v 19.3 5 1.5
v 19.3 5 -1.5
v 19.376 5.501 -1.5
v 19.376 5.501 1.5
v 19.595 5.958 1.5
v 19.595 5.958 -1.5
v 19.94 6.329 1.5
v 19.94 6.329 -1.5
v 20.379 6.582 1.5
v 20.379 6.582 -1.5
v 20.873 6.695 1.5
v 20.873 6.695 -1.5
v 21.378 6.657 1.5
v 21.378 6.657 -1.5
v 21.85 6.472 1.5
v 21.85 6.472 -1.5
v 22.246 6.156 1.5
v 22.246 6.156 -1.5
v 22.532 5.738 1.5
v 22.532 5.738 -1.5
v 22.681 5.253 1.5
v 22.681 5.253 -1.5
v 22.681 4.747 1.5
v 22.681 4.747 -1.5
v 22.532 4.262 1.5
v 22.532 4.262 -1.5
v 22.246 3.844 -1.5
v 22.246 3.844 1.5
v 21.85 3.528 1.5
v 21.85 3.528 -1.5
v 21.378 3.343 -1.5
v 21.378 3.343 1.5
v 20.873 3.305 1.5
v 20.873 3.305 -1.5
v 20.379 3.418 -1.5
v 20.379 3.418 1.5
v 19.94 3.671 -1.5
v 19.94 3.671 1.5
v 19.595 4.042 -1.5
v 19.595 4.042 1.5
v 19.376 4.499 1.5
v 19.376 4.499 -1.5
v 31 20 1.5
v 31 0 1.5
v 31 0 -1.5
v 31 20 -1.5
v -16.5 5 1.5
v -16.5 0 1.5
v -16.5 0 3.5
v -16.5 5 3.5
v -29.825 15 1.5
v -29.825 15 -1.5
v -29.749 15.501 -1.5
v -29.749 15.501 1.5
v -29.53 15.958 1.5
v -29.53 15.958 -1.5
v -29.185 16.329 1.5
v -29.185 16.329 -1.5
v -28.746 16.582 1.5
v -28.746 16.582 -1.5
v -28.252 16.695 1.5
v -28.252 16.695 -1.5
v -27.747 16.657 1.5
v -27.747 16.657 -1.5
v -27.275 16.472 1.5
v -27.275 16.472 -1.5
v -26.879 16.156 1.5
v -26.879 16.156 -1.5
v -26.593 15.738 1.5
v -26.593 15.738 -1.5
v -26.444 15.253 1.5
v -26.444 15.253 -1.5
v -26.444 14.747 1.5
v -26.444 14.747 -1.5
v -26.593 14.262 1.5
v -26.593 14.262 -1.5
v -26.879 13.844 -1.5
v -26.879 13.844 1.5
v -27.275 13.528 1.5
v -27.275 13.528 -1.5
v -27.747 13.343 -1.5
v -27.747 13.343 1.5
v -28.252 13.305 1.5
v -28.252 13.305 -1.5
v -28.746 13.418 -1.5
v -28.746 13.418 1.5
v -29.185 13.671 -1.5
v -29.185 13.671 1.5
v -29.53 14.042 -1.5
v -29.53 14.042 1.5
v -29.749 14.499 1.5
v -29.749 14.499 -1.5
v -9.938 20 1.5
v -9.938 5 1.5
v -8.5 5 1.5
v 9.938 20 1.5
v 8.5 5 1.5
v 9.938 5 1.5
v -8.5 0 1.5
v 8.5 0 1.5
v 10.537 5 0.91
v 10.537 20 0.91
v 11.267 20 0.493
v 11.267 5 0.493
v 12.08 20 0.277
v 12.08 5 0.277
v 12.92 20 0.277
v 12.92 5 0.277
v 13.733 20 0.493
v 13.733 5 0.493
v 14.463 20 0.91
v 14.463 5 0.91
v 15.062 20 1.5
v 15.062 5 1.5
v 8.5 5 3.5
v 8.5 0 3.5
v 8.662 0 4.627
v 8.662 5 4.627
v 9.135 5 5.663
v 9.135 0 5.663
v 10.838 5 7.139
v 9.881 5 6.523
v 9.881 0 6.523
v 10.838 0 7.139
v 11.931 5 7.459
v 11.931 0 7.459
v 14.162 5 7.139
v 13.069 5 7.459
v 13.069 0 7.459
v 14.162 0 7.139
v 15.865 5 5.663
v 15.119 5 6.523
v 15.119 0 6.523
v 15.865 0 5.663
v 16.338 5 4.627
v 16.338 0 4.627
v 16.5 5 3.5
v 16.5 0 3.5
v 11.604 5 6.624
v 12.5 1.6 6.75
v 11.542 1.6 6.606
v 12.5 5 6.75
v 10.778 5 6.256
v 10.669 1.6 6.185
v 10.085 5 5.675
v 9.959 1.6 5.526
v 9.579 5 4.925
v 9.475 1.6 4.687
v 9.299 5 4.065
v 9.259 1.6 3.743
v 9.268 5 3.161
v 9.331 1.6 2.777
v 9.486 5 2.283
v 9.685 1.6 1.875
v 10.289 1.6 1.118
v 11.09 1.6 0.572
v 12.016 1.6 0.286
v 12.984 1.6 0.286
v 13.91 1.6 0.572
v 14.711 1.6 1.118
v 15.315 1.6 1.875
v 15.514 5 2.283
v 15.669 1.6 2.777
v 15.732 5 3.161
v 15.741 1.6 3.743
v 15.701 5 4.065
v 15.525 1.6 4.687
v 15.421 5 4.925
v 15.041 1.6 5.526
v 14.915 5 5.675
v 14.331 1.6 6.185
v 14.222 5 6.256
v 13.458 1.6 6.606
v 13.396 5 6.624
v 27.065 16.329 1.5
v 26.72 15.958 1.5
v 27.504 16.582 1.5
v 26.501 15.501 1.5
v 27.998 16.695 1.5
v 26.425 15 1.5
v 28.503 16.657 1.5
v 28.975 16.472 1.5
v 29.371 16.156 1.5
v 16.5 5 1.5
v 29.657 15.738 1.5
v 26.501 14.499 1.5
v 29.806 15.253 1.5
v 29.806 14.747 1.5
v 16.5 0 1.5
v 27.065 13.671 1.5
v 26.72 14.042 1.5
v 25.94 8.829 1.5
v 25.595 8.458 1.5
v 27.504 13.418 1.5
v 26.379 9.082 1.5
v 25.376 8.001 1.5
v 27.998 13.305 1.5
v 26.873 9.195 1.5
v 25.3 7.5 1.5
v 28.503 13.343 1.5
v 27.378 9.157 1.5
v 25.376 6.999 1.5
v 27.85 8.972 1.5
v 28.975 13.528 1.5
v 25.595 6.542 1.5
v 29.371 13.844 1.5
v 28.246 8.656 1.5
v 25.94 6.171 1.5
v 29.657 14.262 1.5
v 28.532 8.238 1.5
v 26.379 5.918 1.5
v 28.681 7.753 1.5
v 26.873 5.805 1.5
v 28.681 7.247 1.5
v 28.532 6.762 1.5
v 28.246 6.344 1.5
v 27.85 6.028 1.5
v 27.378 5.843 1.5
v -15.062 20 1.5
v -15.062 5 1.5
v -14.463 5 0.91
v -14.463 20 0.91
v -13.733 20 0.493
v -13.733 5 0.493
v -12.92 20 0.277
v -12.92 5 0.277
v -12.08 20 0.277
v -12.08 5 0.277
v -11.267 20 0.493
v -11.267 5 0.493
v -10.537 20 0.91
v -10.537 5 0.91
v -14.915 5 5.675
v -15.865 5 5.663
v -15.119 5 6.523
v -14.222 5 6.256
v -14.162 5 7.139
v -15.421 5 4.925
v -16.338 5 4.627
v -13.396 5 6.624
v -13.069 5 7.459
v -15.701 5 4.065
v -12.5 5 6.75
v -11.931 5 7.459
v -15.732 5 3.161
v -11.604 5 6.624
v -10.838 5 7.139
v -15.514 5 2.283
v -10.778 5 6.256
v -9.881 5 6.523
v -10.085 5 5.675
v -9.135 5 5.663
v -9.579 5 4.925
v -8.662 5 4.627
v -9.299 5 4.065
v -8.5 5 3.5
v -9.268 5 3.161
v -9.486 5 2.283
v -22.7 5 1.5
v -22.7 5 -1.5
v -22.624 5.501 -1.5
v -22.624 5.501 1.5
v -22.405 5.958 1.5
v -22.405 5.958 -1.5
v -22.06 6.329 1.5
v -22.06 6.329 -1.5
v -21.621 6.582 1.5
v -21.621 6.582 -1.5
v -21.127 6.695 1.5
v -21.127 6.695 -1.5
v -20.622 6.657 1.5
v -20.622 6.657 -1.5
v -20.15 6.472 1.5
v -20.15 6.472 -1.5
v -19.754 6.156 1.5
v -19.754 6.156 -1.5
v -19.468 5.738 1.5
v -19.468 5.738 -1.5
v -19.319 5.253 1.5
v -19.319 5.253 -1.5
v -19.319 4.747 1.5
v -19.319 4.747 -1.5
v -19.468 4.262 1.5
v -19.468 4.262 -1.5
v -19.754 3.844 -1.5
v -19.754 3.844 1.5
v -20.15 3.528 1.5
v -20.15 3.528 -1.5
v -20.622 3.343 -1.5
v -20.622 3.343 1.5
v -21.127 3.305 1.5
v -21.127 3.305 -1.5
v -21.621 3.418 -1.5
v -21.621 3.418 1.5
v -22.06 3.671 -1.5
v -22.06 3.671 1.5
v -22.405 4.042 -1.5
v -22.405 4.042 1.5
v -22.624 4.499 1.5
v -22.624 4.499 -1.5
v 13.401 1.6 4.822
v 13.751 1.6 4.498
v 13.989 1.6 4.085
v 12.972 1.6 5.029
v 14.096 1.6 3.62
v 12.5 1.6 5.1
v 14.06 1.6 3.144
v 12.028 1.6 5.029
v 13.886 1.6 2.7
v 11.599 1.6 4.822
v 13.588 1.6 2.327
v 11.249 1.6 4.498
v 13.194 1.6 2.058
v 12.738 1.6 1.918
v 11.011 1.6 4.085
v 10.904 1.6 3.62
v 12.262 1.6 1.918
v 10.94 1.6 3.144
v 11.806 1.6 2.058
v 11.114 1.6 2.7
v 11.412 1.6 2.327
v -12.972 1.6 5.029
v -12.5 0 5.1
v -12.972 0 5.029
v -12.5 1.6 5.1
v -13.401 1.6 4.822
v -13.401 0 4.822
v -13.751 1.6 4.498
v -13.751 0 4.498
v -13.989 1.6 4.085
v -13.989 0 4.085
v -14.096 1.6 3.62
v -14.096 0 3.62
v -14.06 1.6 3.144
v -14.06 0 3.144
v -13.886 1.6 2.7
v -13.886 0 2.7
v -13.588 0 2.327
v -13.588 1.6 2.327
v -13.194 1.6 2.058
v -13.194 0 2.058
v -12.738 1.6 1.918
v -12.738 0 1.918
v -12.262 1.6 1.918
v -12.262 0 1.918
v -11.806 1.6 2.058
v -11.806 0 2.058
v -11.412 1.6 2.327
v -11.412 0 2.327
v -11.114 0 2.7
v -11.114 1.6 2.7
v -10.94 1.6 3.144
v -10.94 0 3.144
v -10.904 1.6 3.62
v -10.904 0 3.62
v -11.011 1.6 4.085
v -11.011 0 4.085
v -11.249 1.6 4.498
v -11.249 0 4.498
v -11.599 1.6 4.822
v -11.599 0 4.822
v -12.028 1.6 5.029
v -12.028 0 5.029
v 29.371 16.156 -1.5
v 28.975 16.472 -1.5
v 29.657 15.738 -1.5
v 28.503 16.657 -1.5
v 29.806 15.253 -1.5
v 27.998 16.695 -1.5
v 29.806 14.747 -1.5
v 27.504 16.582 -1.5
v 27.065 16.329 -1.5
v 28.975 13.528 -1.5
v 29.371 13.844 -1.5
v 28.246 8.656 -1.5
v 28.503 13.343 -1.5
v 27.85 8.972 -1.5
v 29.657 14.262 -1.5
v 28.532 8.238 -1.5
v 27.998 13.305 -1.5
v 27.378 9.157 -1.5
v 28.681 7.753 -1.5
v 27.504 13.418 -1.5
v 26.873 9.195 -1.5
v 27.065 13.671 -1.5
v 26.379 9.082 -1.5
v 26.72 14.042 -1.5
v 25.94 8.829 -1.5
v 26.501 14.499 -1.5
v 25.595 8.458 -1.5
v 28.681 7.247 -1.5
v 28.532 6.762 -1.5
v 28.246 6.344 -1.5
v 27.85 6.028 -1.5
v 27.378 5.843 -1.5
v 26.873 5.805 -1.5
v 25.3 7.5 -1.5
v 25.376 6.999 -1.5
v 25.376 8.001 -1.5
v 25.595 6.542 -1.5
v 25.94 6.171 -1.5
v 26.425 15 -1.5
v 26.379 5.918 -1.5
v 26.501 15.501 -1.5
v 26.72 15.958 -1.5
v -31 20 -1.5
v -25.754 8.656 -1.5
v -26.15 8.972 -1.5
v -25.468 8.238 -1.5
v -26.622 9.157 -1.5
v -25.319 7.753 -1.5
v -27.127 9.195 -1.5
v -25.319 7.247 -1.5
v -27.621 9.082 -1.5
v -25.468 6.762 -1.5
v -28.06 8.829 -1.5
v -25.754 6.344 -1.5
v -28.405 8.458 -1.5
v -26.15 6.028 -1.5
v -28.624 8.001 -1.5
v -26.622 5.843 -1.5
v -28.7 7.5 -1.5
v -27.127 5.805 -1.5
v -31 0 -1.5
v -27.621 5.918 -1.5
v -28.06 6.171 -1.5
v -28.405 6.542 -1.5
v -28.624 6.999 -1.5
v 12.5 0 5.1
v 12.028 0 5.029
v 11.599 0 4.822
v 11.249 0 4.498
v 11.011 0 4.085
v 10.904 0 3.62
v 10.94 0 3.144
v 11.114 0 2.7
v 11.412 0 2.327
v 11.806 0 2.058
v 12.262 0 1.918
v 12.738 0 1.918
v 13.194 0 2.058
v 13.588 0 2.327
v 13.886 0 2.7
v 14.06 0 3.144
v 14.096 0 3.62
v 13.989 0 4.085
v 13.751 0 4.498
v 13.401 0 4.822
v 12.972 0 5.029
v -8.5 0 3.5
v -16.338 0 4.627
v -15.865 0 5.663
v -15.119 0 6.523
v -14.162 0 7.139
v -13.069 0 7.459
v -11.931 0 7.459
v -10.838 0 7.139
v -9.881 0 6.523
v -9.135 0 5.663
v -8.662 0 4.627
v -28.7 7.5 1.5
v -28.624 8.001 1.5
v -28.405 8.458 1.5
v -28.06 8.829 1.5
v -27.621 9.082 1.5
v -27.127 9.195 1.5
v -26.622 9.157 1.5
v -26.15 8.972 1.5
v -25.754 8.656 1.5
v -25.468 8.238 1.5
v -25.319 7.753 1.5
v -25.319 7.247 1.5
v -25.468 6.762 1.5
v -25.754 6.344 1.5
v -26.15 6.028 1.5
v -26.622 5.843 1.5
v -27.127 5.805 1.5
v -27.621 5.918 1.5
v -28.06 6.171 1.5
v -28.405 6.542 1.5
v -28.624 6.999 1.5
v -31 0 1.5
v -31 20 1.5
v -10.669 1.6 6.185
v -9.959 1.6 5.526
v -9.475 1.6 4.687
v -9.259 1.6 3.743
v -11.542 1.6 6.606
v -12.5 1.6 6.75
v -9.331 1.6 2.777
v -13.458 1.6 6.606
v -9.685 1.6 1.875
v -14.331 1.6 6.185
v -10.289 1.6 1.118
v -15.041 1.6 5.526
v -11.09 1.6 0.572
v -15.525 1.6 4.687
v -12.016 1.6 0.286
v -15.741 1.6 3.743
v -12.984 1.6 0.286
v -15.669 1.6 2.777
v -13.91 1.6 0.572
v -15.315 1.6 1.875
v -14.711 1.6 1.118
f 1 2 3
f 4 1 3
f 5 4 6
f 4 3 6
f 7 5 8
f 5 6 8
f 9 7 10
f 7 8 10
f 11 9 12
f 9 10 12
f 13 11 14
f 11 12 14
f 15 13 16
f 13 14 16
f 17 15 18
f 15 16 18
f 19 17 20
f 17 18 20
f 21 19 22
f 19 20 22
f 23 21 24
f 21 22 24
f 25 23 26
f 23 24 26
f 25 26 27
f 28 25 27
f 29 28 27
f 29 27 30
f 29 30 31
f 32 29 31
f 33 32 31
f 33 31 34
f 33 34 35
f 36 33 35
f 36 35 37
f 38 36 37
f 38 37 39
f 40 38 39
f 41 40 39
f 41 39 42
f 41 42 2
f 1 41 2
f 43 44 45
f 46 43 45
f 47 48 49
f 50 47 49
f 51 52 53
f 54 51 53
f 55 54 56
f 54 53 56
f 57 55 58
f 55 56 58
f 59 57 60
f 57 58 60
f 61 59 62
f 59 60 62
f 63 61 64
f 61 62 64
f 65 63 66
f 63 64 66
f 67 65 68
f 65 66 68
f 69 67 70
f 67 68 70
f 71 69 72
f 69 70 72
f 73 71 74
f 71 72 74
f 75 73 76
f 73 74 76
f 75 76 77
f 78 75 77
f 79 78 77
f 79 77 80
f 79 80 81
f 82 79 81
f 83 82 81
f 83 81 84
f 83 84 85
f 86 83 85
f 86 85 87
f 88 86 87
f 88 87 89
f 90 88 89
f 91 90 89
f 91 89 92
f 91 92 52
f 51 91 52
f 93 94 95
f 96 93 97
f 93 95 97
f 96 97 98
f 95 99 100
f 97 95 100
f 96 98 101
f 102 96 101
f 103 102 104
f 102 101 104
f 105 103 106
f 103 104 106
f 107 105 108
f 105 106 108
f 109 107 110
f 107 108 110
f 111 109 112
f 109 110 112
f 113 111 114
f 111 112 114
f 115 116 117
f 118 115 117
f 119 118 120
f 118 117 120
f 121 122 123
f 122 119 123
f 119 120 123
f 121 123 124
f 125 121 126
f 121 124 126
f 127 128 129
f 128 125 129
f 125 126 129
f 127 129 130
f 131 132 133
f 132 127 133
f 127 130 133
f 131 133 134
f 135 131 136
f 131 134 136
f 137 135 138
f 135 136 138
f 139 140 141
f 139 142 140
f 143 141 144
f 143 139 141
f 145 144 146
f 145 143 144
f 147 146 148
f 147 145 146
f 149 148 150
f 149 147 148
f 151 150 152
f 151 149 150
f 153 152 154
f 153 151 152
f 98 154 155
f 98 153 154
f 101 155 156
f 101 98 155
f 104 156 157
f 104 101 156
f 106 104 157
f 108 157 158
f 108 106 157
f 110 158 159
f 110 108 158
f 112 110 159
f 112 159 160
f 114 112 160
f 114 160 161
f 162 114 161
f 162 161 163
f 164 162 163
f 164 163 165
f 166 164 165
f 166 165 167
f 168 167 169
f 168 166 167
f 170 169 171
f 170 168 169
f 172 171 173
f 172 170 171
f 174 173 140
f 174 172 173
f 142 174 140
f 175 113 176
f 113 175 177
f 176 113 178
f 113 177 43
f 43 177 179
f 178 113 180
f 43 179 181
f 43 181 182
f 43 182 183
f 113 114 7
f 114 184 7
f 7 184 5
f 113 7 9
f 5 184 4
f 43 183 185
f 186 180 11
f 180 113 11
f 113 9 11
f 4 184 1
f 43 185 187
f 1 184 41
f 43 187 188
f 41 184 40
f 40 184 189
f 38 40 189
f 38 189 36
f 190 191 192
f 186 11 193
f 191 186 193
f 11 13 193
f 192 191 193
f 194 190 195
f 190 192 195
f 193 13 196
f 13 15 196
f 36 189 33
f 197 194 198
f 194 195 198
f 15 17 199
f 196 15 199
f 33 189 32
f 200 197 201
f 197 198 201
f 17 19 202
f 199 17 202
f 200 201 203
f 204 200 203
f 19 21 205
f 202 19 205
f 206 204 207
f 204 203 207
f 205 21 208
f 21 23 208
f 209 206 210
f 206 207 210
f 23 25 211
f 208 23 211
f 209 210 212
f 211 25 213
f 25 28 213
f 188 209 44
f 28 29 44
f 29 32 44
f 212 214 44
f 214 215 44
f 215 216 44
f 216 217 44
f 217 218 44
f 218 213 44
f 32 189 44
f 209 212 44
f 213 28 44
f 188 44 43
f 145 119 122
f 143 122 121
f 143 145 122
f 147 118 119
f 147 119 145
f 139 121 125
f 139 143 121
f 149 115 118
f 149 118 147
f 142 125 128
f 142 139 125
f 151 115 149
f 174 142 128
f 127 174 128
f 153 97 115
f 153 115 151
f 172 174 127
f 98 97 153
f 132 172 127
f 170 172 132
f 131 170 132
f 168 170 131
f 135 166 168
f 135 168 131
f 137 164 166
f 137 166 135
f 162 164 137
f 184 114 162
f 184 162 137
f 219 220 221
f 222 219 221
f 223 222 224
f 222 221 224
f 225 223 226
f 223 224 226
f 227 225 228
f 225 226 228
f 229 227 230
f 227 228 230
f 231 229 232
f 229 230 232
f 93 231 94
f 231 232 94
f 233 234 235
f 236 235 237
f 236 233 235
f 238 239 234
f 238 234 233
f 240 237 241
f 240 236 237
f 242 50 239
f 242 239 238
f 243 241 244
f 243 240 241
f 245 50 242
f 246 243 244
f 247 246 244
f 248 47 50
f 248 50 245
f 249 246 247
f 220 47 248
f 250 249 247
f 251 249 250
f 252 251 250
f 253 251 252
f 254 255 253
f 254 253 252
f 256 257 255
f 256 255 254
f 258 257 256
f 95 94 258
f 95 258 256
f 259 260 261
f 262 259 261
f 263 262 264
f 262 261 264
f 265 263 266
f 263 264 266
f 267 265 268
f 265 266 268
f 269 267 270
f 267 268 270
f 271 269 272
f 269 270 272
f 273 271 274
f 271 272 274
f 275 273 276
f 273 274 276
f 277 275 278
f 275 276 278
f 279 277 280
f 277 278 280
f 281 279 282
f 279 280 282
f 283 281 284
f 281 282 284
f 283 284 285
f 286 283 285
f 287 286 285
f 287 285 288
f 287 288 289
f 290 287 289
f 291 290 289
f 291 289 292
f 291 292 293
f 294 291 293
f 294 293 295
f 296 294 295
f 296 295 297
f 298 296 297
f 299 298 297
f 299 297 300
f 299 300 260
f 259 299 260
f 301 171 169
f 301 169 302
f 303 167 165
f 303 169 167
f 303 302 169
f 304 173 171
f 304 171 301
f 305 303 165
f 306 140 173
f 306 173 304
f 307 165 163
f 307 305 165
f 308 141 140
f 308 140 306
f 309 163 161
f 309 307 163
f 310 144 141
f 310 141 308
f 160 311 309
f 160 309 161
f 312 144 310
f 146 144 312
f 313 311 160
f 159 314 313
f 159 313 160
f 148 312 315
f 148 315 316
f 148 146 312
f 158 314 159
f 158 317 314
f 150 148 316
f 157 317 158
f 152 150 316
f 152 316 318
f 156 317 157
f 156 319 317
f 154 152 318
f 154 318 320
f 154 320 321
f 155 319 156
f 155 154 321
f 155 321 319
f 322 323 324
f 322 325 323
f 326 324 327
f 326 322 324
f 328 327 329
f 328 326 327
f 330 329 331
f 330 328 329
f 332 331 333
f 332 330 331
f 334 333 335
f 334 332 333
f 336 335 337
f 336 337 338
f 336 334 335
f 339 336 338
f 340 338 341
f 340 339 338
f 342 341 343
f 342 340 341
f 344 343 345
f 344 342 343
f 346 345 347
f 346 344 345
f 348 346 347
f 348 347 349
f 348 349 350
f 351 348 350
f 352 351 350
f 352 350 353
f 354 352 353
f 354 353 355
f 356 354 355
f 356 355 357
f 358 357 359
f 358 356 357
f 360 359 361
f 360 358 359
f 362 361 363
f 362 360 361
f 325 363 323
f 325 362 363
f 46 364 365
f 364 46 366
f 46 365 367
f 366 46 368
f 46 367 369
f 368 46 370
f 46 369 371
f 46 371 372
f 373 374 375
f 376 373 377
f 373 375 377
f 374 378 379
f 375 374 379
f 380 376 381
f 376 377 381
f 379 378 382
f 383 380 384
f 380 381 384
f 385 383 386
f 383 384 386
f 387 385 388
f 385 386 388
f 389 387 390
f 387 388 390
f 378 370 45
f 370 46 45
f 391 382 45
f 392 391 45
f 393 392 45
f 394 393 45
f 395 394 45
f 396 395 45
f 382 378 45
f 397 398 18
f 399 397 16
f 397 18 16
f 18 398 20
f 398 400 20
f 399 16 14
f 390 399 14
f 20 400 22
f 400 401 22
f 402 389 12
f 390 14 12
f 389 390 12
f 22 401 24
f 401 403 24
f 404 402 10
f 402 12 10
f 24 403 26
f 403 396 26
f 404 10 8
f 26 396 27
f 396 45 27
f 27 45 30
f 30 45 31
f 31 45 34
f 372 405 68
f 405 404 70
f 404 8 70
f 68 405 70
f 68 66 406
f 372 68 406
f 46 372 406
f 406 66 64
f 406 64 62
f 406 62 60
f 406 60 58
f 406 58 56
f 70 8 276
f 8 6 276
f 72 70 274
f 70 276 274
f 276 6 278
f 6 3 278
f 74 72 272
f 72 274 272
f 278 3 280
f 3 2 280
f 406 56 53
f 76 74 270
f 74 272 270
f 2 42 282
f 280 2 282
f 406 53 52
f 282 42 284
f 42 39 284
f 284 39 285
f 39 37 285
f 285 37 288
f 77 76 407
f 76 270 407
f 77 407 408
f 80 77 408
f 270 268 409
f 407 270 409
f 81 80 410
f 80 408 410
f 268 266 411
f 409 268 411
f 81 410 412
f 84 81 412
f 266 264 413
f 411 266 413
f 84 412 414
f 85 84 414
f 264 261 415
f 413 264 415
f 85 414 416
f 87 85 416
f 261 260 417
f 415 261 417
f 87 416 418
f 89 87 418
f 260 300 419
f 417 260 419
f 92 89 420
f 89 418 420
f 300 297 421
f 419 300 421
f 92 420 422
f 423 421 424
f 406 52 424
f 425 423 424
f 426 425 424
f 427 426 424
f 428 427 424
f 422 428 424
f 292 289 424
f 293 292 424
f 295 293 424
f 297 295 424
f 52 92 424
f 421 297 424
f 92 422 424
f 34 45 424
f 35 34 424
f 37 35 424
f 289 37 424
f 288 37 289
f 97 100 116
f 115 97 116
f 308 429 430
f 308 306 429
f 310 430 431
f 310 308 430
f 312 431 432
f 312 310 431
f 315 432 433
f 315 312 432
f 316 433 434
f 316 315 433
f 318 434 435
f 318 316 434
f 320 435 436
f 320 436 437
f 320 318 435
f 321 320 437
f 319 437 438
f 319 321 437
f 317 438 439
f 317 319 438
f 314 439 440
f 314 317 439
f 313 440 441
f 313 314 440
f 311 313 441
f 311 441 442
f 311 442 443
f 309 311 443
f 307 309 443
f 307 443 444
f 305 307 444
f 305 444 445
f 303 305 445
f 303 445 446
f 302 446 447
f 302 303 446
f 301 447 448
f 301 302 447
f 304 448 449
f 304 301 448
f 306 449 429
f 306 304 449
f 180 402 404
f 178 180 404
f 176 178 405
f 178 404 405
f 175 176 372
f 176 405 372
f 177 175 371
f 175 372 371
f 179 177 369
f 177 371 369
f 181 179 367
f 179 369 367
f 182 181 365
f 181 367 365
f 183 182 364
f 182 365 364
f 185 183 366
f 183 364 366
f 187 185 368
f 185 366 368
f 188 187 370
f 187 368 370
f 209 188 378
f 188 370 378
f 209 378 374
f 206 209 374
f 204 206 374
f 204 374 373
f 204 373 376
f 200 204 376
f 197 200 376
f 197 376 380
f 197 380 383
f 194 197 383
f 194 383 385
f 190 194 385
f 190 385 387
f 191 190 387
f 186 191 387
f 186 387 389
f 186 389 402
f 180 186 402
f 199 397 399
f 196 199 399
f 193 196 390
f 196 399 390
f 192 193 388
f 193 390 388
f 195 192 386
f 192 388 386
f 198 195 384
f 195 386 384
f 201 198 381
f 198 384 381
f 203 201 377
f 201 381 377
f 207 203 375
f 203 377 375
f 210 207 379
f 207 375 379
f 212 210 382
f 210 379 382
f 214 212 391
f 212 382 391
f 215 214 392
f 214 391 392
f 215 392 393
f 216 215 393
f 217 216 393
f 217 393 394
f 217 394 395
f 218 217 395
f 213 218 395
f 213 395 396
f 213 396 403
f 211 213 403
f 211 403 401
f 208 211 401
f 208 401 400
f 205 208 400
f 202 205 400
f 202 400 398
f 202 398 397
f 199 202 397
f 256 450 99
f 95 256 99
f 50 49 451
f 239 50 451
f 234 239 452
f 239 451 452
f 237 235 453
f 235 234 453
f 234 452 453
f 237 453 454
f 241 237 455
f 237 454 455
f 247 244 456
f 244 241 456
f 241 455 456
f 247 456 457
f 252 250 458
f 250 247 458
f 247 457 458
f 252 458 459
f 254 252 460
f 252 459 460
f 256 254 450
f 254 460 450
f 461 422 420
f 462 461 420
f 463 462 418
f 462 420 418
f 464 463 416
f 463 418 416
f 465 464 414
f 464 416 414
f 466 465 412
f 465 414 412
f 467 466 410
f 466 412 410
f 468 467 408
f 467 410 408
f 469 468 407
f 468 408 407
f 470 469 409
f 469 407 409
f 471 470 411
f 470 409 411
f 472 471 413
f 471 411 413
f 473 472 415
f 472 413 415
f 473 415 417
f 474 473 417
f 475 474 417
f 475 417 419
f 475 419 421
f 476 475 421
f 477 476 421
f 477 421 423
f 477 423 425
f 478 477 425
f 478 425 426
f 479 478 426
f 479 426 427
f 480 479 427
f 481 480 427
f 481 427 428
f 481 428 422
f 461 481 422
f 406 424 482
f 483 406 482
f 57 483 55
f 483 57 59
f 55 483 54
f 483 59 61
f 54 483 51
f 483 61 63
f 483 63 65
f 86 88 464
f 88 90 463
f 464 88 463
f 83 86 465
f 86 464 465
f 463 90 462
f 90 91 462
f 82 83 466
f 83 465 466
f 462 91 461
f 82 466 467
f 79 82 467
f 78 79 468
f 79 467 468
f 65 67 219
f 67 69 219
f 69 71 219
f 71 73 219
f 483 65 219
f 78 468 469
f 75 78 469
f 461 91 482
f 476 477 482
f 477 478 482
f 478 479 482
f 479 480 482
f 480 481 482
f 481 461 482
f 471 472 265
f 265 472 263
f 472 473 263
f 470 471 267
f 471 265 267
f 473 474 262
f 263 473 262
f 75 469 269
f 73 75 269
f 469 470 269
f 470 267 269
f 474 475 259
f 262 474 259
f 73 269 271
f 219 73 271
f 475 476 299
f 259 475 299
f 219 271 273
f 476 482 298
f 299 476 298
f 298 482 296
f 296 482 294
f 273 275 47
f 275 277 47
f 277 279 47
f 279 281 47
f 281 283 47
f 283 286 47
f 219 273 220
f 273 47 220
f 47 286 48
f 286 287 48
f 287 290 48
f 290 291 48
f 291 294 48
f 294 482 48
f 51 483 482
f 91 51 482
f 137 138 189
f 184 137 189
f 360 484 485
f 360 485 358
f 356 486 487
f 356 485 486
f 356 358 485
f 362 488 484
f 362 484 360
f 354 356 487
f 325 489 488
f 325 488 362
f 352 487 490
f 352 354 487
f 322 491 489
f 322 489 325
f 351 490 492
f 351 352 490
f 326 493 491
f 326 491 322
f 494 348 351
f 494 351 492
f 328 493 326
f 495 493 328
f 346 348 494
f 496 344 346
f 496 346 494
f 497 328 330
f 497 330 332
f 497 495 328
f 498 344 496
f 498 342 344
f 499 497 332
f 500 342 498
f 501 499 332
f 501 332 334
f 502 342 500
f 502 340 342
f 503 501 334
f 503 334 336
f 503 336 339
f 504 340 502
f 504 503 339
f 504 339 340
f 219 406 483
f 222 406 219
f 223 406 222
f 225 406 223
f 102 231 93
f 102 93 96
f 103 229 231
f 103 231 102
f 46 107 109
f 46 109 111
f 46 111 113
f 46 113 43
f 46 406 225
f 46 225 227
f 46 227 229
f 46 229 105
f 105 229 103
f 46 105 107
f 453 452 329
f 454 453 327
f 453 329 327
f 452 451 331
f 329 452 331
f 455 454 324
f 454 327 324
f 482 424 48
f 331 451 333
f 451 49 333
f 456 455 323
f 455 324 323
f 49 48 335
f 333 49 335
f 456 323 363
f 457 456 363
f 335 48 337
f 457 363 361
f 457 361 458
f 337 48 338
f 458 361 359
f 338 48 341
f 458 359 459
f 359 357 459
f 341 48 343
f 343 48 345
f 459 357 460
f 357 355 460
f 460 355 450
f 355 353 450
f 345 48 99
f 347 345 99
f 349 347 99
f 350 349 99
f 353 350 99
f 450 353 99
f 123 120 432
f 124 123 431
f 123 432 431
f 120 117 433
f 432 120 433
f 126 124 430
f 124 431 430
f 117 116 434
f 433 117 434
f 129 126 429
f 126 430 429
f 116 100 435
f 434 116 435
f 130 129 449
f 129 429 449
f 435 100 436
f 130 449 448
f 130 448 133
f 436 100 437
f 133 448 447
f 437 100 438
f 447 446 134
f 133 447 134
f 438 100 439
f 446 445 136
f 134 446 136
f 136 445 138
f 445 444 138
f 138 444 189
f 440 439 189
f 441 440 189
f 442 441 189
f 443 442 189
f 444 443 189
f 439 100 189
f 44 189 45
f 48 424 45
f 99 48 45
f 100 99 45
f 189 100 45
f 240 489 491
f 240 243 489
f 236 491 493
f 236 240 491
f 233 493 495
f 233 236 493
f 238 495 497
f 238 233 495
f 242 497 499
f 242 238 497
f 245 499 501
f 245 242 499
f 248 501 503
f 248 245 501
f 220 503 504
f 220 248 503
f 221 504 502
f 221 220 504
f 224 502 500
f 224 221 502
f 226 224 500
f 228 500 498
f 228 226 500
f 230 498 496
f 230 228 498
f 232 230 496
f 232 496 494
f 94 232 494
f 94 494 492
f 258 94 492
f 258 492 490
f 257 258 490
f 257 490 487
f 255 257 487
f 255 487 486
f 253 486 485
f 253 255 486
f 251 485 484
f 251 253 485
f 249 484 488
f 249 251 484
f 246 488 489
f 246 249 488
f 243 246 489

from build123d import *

# Parameters (mm, degrees)
BOSS_EXTRUDE1_DEPTH                          = 20
SKETCH2_W                                    = 33
SKETCH2_H                                    = 6
CUT_EXTRUDE1_DEPTH                           = 15
CBORE_FOR_M3_HEX_SOCKET_HEAD_CAP_SCR_2_COUNT = 2
CBORE_FOR_M3_HEX_SOCKET_HEAD_CAP_SCR_2_PITCH = 25
CUT_EXTRUDE2_DEPTH                           = 15
M3_CLEARANCE_HOLE1_D                         = 3.4
M3_CLEARANCE_HOLE1_DEPTH                     = 3


with BuildPart() as part:
    # Sketch1 → Boss-Extrude1 (new body)
    with BuildSketch(Plane(origin=(0, 0, 0), x_dir=(1, 0, 0), z_dir=(0, 1, 0))):
        with BuildLine():
            Line((-31, -1.5), (-16.5, -1.5))
            Line((-16.5, -1.5), (-16.5, -3.5))
            ThreePointArc((-16.5, -3.5), (-12.5, -7.5), (-8.5, -3.5))
            Line((-8.5, -3.5), (-8.5, -1.5))
            Line((-8.5, -1.5), (8.5, -1.5))
            Line((8.5, -1.5), (8.5, -3.5))
            ThreePointArc((8.5, -3.5), (12.5, -7.5), (16.5, -3.5))
            Line((16.5, -3.5), (16.5, -1.5))
            Line((16.5, -1.5), (31, -1.5))
            Line((31, -1.5), (31, 1.5))
            Line((31, 1.5), (-31, 1.5))
            Line((-31, 1.5), (-31, -1.5))
        make_face()
    extrude(amount=BOSS_EXTRUDE1_DEPTH)

    # Sketch2 → Cut-Extrude1 (cut)
    with BuildSketch(Plane(origin=(0, 20, 0), x_dir=(1, 0, 0), z_dir=(0, 1, 0))):
        with Locations((0, -4.5)):
            Rectangle(SKETCH2_W, SKETCH2_H)
    extrude(amount=-CUT_EXTRUDE1_DEPTH, mode=Mode.SUBTRACT)

    # Sketch4 → CBORE for M3 Hex Socket Head Cap Screw1 (revolve, cut)
    with BuildSketch(Plane(origin=(-12.5, 5, 3.5), x_dir=(0, 0, 1), z_dir=(1, 0, 0))):
        Polygon((0, 0), (0, 5), (1.6, 5), (1.6, 3.4), (3.25, 3.4), (3.25, 0), align=None)
    cbore_for_m3_hex_socket_head_cap_screw1 = revolve(axis=Axis((-12.5, 11.35, 3.5), (0, -1, 0)), mode=Mode.SUBTRACT)

    # CBORE for M3 Hex Socket Head Cap Scr 2: CBORE for M3 Hex Socket Head Cap Screw1 ×2
    with Locations(*[(i * CBORE_FOR_M3_HEX_SOCKET_HEAD_CAP_SCR_2_PITCH, 0, 0) for i in range(1, CBORE_FOR_M3_HEX_SOCKET_HEAD_CAP_SCR_2_COUNT)]):
        add(cbore_for_m3_hex_socket_head_cap_screw1, mode=Mode.SUBTRACT)

    # Sketch5 → Cut-Extrude2 (cut)
    with BuildSketch(Plane.XZ.offset(-5)):
        with BuildLine():
            Line((-9.938262309, 1.5), (-15.061737691, 1.5))
            ThreePointArc((-15.061737691, 1.5), (-12.5, 0.25), (-9.938262309, 1.5))
        make_face()
        with BuildLine():
            Line((15.061737691, 1.5), (9.938262309, 1.5))
            ThreePointArc((9.938262309, 1.5), (12.5, 0.25), (15.061737691, 1.5))
        make_face()
    extrude(amount=-CUT_EXTRUDE2_DEPTH, mode=Mode.SUBTRACT)

    # M3 Clearance Hole1
    with Locations(Plane.XY.offset(1.5)):
        with Locations((-28.125, 15), (28.125, 15), (-21, 5), (21, 5), (-27, 7.5), (27, 7.5)):
            Hole(M3_CLEARANCE_HOLE1_D / 2, depth=M3_CLEARANCE_HOLE1_DEPTH)


solid = part.part
